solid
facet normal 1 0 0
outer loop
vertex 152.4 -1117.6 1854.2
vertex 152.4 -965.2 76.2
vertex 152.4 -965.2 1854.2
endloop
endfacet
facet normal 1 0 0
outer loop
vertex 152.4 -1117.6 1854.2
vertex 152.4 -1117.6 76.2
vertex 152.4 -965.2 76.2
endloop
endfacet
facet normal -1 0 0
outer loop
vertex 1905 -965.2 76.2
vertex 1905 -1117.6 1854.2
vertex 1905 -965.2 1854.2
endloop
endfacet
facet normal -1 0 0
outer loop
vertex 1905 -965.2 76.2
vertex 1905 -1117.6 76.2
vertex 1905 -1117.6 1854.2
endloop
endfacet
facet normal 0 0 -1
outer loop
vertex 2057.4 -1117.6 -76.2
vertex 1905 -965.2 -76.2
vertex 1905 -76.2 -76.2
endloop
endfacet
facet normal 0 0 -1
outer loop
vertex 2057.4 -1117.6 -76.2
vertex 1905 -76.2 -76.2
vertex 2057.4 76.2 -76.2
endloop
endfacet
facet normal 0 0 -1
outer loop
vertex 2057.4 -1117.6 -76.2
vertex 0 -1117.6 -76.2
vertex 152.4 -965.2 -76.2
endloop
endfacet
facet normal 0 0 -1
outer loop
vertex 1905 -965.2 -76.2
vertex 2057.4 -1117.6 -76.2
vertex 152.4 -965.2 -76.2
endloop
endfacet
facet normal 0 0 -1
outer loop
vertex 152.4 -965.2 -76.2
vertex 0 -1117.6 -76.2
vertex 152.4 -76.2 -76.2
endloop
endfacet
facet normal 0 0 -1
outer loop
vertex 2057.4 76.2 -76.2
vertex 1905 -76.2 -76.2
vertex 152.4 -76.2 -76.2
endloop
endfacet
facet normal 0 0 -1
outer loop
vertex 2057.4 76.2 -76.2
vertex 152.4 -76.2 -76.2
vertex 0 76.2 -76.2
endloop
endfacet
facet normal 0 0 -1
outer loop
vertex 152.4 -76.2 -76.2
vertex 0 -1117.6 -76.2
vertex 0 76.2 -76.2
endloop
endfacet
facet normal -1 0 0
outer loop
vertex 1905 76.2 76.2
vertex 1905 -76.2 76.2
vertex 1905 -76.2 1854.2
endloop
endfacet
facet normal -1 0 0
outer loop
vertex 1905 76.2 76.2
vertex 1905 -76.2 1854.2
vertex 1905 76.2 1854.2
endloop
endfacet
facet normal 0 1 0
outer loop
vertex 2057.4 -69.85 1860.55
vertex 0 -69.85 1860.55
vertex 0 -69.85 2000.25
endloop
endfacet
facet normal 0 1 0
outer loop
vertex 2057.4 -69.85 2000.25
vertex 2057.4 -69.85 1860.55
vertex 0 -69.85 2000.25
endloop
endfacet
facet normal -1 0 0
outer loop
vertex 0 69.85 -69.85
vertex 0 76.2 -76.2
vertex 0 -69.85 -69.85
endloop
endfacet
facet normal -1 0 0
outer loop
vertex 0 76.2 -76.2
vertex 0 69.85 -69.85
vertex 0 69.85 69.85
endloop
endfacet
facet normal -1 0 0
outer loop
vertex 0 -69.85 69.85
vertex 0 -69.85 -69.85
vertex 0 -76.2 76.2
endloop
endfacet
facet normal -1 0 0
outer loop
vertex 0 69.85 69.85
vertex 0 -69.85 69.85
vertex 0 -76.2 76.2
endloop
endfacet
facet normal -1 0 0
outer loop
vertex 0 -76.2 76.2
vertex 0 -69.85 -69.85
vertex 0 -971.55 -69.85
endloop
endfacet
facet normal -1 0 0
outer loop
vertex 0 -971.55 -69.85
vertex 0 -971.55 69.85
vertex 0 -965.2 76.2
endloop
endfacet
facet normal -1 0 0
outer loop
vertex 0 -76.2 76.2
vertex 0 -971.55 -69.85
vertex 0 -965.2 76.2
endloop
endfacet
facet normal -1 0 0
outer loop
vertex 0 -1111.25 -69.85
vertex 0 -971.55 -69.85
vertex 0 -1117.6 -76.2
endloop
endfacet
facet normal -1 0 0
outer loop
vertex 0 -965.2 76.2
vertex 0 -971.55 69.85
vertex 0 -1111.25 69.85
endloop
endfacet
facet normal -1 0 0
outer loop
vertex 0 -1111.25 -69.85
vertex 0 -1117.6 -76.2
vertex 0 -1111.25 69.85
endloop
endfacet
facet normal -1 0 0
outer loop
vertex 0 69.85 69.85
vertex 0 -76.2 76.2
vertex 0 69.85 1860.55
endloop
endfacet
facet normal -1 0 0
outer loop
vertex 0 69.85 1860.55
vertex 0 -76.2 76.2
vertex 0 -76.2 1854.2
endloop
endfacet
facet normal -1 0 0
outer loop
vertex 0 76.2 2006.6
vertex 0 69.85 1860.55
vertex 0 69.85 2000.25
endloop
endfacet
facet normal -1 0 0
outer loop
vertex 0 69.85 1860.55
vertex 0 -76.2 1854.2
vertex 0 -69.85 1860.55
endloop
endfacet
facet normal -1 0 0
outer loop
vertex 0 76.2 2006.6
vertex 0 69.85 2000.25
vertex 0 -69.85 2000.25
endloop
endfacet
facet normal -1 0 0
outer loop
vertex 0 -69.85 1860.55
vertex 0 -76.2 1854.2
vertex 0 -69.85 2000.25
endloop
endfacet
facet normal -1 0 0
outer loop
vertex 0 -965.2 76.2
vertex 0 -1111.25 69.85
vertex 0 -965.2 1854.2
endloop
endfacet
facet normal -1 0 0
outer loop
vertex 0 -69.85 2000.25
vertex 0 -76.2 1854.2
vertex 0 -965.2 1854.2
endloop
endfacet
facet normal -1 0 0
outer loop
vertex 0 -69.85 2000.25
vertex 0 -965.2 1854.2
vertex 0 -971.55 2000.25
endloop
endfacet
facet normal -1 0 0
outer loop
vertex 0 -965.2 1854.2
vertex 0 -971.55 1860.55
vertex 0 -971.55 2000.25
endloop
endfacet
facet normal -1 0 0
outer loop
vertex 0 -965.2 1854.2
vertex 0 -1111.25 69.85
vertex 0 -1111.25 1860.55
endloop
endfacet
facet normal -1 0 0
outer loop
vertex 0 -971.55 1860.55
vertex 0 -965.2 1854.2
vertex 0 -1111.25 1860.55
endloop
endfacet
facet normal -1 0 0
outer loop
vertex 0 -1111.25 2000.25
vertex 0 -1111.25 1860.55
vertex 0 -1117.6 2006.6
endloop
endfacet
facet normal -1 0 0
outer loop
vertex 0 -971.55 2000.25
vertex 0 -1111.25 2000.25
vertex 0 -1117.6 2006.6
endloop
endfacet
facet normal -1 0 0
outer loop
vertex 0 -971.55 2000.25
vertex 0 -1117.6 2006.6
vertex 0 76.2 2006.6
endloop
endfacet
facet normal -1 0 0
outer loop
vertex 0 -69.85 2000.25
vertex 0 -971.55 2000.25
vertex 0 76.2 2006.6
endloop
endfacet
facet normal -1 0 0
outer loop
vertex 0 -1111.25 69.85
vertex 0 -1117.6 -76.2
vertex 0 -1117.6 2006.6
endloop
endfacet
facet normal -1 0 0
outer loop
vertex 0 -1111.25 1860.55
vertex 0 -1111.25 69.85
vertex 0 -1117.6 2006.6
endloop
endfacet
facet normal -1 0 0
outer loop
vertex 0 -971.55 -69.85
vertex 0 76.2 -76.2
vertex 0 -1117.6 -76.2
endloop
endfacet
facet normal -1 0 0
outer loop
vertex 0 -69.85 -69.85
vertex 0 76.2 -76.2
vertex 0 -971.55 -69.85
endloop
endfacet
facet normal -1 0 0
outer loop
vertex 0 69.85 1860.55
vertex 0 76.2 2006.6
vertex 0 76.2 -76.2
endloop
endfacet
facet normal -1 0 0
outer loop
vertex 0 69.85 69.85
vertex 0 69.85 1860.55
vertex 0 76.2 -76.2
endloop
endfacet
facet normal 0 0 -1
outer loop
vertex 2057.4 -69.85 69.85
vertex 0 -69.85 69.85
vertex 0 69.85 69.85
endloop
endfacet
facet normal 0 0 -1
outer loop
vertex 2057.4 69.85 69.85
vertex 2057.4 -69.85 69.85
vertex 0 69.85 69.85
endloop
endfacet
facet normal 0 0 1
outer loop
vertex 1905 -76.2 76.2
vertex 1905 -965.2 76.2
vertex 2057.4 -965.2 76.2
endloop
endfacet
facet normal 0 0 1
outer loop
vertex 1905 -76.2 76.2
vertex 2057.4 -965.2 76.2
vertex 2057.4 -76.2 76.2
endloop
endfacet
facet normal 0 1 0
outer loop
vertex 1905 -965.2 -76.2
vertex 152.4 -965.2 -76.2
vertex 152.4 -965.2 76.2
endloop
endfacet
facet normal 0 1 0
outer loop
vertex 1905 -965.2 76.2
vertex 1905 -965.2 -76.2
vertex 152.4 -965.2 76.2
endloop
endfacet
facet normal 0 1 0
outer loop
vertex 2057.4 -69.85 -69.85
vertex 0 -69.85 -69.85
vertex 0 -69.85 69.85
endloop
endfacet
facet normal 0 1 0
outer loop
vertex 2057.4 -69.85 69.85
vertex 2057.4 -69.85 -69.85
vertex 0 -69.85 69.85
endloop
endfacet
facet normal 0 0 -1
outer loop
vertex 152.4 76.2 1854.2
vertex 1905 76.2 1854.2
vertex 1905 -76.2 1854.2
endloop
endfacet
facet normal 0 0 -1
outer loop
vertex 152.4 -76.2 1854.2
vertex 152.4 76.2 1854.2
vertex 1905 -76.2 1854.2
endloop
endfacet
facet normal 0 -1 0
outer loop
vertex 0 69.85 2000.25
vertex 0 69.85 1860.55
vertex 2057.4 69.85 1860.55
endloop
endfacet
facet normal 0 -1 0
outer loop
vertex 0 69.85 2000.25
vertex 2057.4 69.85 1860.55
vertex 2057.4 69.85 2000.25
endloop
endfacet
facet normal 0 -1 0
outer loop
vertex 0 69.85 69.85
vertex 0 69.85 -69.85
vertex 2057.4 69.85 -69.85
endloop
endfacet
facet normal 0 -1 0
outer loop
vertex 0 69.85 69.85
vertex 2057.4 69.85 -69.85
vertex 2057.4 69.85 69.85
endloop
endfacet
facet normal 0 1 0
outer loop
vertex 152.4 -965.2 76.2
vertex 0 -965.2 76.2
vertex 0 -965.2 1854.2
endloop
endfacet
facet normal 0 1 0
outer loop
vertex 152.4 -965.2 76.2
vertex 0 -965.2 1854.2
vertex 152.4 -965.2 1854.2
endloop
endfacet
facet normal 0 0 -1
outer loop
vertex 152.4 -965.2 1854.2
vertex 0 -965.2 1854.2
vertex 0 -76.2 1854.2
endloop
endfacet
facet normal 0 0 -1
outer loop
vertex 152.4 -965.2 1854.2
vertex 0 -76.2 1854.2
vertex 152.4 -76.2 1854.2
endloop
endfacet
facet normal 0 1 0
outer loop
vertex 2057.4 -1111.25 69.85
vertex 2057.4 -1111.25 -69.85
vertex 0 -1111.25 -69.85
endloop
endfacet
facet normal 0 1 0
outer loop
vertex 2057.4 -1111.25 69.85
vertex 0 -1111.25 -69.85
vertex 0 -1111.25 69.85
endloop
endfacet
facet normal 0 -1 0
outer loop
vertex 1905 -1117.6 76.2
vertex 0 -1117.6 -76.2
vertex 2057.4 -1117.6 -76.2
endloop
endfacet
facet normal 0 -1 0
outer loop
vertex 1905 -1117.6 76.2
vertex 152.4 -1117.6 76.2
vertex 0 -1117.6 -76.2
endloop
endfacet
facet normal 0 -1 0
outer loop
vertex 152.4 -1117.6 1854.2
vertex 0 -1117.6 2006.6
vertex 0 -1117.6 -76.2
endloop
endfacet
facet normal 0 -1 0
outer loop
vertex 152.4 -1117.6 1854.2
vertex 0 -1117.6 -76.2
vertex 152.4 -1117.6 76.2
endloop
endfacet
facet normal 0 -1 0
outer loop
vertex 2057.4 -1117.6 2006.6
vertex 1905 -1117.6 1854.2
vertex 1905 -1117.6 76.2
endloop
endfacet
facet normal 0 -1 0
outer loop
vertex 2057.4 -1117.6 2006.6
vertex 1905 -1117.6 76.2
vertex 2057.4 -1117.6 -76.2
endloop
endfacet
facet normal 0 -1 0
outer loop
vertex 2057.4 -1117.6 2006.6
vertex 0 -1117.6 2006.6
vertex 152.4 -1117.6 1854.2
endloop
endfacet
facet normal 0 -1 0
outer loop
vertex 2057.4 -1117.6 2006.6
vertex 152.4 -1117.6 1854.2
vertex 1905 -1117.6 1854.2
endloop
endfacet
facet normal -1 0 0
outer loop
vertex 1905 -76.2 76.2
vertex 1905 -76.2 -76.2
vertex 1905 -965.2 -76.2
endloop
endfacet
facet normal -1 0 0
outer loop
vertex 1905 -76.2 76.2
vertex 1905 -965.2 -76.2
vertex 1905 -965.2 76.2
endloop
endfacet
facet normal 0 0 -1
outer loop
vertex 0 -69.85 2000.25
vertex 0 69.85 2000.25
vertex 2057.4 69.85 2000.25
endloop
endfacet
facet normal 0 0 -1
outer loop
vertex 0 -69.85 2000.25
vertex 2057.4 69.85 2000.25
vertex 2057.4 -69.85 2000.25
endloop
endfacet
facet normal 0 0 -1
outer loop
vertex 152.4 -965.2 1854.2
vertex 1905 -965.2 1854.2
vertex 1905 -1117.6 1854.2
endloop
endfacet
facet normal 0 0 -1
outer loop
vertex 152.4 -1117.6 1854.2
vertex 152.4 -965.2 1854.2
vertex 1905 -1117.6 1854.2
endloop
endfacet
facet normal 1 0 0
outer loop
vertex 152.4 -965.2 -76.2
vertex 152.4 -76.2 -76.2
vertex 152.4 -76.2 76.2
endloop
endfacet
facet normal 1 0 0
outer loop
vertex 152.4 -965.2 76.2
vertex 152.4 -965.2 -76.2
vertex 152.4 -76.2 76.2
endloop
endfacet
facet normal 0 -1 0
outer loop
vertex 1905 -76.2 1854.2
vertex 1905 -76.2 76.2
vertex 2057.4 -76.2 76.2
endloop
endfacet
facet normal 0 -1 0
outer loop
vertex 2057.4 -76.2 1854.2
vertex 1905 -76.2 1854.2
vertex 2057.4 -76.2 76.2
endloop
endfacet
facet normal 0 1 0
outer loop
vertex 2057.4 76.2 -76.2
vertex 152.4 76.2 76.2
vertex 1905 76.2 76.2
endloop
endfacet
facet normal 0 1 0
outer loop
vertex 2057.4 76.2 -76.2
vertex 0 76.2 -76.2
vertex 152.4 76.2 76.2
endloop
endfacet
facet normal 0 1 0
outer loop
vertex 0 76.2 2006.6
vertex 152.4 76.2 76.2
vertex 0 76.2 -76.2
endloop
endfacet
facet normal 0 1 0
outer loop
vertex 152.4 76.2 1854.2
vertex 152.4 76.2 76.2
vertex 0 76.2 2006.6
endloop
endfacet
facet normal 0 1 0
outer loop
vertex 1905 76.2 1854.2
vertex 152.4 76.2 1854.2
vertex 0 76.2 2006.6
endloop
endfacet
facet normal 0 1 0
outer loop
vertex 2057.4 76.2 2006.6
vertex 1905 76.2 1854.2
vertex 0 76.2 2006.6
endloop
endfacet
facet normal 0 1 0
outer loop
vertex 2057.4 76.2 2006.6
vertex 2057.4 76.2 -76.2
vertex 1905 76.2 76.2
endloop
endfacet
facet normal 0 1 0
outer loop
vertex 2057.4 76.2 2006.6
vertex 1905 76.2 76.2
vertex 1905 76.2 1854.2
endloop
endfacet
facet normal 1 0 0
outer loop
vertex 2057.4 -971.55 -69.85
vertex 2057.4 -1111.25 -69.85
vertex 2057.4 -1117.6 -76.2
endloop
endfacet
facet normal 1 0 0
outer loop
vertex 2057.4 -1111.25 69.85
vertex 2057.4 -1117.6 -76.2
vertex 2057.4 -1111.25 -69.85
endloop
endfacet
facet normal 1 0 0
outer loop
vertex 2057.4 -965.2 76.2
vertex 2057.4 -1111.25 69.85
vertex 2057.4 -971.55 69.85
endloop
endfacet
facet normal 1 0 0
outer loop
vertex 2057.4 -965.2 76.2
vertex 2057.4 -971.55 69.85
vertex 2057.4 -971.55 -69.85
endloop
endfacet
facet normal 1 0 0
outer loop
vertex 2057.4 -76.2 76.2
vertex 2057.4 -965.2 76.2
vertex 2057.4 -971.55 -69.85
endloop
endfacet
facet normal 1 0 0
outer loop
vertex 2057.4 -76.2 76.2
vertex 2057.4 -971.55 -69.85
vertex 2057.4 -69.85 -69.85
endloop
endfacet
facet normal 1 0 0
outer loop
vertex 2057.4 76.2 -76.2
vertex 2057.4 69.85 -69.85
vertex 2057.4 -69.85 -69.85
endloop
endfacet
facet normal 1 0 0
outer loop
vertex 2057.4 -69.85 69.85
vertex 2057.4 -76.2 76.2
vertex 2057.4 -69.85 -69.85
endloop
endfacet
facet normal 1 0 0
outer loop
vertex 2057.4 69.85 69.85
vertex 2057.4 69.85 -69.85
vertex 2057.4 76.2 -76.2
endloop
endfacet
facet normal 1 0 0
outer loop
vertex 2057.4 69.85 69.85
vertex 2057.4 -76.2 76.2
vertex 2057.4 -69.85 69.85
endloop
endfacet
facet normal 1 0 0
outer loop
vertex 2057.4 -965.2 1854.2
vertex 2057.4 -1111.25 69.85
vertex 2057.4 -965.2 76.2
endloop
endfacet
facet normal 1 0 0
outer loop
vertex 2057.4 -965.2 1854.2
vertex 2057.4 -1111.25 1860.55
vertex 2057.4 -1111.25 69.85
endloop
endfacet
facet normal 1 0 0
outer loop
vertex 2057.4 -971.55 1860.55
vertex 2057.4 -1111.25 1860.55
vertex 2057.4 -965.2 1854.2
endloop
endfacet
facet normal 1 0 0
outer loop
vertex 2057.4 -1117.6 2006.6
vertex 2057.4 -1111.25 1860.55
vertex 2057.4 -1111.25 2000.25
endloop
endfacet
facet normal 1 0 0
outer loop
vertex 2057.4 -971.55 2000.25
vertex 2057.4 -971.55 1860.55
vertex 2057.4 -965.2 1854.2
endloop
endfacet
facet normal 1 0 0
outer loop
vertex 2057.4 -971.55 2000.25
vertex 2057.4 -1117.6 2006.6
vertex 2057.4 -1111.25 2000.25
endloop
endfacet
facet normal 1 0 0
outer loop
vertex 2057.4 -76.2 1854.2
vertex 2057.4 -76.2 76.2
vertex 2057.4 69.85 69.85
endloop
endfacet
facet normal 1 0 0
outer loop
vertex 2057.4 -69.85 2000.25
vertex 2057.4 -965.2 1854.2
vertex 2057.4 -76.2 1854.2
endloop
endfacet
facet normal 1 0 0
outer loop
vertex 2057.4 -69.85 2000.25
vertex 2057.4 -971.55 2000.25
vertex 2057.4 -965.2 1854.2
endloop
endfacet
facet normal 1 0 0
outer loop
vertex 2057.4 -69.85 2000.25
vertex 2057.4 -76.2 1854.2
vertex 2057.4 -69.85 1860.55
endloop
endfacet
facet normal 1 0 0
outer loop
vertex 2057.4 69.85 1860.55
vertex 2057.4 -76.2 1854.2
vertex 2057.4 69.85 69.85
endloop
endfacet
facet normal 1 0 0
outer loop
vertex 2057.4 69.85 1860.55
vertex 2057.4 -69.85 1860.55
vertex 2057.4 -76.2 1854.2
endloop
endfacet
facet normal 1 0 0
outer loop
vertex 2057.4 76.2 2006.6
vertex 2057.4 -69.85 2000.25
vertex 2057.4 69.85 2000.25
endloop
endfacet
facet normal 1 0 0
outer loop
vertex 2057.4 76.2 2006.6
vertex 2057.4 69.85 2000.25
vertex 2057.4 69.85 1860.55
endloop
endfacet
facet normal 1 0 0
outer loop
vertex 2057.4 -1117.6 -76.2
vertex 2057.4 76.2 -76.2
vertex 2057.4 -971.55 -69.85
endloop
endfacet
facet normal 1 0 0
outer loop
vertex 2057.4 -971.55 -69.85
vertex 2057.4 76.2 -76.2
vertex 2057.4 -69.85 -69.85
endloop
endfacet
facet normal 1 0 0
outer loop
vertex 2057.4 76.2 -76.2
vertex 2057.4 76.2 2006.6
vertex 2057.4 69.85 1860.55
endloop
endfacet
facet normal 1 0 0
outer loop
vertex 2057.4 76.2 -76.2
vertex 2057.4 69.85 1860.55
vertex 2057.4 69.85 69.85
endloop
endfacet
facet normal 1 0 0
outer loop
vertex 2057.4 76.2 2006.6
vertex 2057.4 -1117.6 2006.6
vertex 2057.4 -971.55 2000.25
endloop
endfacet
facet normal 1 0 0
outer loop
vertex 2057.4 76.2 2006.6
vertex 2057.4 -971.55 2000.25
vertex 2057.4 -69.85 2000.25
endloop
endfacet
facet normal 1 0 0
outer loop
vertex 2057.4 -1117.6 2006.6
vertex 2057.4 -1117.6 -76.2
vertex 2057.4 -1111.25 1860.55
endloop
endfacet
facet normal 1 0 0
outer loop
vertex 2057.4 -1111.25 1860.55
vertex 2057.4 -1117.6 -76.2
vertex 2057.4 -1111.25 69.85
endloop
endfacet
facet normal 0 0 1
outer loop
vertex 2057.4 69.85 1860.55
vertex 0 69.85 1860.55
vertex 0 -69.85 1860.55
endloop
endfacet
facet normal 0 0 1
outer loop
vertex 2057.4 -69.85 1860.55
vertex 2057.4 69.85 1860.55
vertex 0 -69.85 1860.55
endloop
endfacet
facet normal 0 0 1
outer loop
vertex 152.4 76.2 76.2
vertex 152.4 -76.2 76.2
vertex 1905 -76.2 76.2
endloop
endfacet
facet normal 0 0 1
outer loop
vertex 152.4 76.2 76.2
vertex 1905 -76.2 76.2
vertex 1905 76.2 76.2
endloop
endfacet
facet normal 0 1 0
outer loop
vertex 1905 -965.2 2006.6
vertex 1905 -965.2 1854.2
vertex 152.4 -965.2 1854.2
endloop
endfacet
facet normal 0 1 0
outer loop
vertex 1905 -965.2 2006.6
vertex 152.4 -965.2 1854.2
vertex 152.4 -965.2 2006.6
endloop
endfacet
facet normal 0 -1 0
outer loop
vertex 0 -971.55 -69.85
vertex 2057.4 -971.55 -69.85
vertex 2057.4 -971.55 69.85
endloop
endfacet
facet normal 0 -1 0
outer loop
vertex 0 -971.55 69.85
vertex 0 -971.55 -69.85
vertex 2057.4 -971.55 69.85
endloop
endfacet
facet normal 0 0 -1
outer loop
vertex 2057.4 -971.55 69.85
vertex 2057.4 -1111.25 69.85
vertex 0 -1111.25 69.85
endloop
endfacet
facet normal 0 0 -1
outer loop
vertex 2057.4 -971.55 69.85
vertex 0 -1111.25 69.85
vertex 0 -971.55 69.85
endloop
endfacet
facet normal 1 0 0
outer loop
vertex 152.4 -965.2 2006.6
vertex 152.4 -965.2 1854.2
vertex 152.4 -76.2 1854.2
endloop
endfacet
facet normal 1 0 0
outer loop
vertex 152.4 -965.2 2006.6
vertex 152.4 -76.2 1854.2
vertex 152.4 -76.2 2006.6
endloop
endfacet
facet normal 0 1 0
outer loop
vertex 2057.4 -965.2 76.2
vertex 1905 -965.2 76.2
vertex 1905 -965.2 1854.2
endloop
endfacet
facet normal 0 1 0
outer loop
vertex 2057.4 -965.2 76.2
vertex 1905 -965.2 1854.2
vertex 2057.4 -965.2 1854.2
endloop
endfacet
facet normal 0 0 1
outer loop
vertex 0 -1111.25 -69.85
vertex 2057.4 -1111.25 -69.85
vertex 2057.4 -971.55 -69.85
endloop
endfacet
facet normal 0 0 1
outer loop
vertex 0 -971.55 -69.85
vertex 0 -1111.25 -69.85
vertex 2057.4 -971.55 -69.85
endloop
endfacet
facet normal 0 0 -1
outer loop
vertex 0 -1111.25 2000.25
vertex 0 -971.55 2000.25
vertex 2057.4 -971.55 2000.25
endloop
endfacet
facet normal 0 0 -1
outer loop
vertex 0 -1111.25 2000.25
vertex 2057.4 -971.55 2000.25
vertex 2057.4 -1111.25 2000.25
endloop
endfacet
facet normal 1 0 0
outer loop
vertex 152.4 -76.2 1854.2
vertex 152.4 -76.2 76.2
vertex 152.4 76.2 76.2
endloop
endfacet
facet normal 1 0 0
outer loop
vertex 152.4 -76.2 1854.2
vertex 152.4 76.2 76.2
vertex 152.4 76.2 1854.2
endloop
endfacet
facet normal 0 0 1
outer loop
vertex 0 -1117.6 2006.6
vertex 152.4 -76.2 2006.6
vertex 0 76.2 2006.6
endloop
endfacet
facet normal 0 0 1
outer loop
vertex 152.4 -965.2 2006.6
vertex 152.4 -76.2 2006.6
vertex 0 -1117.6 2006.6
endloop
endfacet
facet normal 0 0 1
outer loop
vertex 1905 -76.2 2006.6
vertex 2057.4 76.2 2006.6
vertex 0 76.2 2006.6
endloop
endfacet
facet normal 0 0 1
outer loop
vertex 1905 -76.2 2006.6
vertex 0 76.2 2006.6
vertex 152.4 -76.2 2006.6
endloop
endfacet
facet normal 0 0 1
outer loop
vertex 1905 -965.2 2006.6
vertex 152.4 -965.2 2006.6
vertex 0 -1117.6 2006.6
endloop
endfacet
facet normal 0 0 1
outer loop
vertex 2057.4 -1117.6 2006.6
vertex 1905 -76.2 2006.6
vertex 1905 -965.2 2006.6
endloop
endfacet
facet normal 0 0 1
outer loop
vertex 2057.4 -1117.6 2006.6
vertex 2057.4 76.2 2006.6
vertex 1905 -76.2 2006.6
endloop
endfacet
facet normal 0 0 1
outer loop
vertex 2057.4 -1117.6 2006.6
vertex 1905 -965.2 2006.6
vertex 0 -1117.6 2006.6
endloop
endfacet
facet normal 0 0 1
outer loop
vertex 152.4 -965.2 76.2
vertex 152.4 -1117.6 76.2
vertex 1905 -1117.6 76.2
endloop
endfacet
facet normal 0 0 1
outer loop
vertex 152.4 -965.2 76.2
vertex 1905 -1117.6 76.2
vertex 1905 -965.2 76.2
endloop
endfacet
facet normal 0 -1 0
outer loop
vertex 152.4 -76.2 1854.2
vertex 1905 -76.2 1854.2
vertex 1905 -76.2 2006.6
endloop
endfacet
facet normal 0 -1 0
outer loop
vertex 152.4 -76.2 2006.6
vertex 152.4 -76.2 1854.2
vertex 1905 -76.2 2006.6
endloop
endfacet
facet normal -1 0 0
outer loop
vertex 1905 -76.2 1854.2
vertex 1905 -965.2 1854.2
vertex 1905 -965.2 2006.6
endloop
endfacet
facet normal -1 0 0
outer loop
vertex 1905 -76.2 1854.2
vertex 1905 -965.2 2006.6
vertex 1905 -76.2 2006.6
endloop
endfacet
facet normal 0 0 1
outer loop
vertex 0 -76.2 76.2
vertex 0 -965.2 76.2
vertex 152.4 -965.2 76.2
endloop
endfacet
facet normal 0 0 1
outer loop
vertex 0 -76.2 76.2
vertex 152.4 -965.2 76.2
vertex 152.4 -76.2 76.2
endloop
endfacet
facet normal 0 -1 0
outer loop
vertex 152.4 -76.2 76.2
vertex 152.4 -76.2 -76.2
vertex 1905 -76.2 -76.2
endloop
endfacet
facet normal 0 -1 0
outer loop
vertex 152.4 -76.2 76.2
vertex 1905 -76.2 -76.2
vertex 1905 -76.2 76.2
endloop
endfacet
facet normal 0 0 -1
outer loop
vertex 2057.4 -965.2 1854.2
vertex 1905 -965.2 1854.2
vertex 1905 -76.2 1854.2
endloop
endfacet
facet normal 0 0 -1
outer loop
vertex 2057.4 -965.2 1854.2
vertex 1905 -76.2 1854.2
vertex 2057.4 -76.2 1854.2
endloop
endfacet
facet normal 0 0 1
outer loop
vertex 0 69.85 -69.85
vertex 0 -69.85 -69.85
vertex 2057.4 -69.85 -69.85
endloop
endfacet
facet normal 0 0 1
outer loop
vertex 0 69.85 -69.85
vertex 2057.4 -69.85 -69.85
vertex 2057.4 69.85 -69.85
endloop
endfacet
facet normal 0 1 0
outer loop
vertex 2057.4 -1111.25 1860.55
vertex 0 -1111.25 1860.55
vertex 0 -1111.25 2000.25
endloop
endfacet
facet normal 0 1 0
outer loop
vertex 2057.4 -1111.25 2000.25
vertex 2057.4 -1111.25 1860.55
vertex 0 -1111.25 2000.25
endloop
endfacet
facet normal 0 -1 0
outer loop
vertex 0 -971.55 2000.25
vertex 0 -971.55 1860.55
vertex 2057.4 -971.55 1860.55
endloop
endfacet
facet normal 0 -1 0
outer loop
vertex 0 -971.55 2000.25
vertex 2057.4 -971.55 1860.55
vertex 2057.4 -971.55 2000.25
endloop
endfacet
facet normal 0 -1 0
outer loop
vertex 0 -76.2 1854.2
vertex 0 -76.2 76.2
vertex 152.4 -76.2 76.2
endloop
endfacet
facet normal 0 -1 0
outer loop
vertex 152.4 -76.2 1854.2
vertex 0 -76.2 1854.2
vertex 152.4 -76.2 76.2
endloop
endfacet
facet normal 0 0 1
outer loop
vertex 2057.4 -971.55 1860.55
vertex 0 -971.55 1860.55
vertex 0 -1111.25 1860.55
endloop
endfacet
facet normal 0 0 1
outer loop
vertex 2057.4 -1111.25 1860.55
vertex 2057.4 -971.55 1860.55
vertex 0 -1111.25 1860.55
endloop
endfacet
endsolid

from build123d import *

# Parameters (mm, degrees)
F0_W      = 152.4
F0_H      = 152.4
F0_W_2    = 139.7
F0_H_2    = 139.7
F1_DEPTH  = 2057.4
F2_W      = 152.4
F2_H      = 152.4
F3_DEPTH  = 1041.4
F4_W      = 152.4
F4_H      = 152.4
F5_DEPTH  = 1752.6
F6_W      = 139.7
F6_H      = 139.7
F7_DEPTH  = 2286
F8_W      = 152.4
F8_H      = 152.4
F9_DEPTH  = 1778
F10_W     = 152.4
F10_H     = 152.4
F11_DEPTH = 1193.8
F12_W     = 152.4
F12_H     = 152.4
F13_DEPTH = 1752.6
F14_W     = 139.7
F14_H     = 139.7
F15_DEPTH = 2286


with BuildPart() as f1:
    # F0 (on Right) → F1 (new body)
    with BuildSketch(Plane.YZ):
        Rectangle(F0_W, F0_H)
        Rectangle(F0_W_2, F0_H_2, mode=Mode.SUBTRACT)
    extrude(amount=F1_DEPTH)

    # F2 (on face) → F3 (join)
    with BuildSketch(Plane.XZ.offset(76.2)):
        with Locations((76.2, 0)):
            Rectangle(F2_W, F2_H)
        with Locations((1981.2, 0)):
            Rectangle(F2_W, F2_H)
    extrude(amount=F3_DEPTH)

    # F4 (on face) → F5 (join)
    with BuildSketch(Plane.YZ.offset(152.4)):
        with Locations((-1041.4, 0)):
            Rectangle(F4_W, F4_H)
    extrude(amount=F5_DEPTH)

    # F6 (on face) → F7 (cut)
    with BuildSketch(Plane.YZ.offset(2057.4)):
        with Locations((-1041.4, 0)):
            Rectangle(F6_W, F6_H)
    extrude(amount=-F7_DEPTH, mode=Mode.SUBTRACT)

    # F8 (on face) → F9 (join)
    with BuildSketch(Plane.XY.offset(76.2)):
        with Locations((76.2, 0)):
            Rectangle(F8_W, F8_H)
        with Locations((76.2, -1041.4)):
            Rectangle(F8_W, F8_H)
        with Locations((1981.2, -1041.4)):
            Rectangle(F8_W, F8_H)
        with Locations((1981.2, 0)):
            Rectangle(F8_W, F8_H)
    extrude(amount=F9_DEPTH)

    # F10 (on face) → F11 (join)
    with BuildSketch(Plane.XZ.offset(1117.6)):
        with Locations((76.2, 1930.4)):
            Rectangle(F10_W, F10_H)
        with Locations((1981.2, 1930.4)):
            Rectangle(F10_W, F10_H)
    extrude(amount=-F11_DEPTH)

    # F12 (on face) → F13 (join)
    with BuildSketch(Plane(origin=(1905, 0, 0), x_dir=(0, -1, 0), z_dir=(-1, 0, 0))):
        with Locations((0, 1930.4)):
            Rectangle(F12_W, F12_H)
        with Locations((1041.4, 1930.4)):
            Rectangle(F12_W, F12_H)
    extrude(amount=F13_DEPTH)

    # F14 (on face) → F15 (cut)
    with BuildSketch(Plane(origin=(0, 0, 0), x_dir=(0, -1, 0), z_dir=(-1, 0, 0))):
        with Locations((0, 1930.4)):
            Rectangle(F14_W, F14_H)
        with Locations((1041.4, 1930.4)):
            Rectangle(F14_W, F14_H)
    extrude(amount=-F15_DEPTH, mode=Mode.SUBTRACT)


solid = f1.part
